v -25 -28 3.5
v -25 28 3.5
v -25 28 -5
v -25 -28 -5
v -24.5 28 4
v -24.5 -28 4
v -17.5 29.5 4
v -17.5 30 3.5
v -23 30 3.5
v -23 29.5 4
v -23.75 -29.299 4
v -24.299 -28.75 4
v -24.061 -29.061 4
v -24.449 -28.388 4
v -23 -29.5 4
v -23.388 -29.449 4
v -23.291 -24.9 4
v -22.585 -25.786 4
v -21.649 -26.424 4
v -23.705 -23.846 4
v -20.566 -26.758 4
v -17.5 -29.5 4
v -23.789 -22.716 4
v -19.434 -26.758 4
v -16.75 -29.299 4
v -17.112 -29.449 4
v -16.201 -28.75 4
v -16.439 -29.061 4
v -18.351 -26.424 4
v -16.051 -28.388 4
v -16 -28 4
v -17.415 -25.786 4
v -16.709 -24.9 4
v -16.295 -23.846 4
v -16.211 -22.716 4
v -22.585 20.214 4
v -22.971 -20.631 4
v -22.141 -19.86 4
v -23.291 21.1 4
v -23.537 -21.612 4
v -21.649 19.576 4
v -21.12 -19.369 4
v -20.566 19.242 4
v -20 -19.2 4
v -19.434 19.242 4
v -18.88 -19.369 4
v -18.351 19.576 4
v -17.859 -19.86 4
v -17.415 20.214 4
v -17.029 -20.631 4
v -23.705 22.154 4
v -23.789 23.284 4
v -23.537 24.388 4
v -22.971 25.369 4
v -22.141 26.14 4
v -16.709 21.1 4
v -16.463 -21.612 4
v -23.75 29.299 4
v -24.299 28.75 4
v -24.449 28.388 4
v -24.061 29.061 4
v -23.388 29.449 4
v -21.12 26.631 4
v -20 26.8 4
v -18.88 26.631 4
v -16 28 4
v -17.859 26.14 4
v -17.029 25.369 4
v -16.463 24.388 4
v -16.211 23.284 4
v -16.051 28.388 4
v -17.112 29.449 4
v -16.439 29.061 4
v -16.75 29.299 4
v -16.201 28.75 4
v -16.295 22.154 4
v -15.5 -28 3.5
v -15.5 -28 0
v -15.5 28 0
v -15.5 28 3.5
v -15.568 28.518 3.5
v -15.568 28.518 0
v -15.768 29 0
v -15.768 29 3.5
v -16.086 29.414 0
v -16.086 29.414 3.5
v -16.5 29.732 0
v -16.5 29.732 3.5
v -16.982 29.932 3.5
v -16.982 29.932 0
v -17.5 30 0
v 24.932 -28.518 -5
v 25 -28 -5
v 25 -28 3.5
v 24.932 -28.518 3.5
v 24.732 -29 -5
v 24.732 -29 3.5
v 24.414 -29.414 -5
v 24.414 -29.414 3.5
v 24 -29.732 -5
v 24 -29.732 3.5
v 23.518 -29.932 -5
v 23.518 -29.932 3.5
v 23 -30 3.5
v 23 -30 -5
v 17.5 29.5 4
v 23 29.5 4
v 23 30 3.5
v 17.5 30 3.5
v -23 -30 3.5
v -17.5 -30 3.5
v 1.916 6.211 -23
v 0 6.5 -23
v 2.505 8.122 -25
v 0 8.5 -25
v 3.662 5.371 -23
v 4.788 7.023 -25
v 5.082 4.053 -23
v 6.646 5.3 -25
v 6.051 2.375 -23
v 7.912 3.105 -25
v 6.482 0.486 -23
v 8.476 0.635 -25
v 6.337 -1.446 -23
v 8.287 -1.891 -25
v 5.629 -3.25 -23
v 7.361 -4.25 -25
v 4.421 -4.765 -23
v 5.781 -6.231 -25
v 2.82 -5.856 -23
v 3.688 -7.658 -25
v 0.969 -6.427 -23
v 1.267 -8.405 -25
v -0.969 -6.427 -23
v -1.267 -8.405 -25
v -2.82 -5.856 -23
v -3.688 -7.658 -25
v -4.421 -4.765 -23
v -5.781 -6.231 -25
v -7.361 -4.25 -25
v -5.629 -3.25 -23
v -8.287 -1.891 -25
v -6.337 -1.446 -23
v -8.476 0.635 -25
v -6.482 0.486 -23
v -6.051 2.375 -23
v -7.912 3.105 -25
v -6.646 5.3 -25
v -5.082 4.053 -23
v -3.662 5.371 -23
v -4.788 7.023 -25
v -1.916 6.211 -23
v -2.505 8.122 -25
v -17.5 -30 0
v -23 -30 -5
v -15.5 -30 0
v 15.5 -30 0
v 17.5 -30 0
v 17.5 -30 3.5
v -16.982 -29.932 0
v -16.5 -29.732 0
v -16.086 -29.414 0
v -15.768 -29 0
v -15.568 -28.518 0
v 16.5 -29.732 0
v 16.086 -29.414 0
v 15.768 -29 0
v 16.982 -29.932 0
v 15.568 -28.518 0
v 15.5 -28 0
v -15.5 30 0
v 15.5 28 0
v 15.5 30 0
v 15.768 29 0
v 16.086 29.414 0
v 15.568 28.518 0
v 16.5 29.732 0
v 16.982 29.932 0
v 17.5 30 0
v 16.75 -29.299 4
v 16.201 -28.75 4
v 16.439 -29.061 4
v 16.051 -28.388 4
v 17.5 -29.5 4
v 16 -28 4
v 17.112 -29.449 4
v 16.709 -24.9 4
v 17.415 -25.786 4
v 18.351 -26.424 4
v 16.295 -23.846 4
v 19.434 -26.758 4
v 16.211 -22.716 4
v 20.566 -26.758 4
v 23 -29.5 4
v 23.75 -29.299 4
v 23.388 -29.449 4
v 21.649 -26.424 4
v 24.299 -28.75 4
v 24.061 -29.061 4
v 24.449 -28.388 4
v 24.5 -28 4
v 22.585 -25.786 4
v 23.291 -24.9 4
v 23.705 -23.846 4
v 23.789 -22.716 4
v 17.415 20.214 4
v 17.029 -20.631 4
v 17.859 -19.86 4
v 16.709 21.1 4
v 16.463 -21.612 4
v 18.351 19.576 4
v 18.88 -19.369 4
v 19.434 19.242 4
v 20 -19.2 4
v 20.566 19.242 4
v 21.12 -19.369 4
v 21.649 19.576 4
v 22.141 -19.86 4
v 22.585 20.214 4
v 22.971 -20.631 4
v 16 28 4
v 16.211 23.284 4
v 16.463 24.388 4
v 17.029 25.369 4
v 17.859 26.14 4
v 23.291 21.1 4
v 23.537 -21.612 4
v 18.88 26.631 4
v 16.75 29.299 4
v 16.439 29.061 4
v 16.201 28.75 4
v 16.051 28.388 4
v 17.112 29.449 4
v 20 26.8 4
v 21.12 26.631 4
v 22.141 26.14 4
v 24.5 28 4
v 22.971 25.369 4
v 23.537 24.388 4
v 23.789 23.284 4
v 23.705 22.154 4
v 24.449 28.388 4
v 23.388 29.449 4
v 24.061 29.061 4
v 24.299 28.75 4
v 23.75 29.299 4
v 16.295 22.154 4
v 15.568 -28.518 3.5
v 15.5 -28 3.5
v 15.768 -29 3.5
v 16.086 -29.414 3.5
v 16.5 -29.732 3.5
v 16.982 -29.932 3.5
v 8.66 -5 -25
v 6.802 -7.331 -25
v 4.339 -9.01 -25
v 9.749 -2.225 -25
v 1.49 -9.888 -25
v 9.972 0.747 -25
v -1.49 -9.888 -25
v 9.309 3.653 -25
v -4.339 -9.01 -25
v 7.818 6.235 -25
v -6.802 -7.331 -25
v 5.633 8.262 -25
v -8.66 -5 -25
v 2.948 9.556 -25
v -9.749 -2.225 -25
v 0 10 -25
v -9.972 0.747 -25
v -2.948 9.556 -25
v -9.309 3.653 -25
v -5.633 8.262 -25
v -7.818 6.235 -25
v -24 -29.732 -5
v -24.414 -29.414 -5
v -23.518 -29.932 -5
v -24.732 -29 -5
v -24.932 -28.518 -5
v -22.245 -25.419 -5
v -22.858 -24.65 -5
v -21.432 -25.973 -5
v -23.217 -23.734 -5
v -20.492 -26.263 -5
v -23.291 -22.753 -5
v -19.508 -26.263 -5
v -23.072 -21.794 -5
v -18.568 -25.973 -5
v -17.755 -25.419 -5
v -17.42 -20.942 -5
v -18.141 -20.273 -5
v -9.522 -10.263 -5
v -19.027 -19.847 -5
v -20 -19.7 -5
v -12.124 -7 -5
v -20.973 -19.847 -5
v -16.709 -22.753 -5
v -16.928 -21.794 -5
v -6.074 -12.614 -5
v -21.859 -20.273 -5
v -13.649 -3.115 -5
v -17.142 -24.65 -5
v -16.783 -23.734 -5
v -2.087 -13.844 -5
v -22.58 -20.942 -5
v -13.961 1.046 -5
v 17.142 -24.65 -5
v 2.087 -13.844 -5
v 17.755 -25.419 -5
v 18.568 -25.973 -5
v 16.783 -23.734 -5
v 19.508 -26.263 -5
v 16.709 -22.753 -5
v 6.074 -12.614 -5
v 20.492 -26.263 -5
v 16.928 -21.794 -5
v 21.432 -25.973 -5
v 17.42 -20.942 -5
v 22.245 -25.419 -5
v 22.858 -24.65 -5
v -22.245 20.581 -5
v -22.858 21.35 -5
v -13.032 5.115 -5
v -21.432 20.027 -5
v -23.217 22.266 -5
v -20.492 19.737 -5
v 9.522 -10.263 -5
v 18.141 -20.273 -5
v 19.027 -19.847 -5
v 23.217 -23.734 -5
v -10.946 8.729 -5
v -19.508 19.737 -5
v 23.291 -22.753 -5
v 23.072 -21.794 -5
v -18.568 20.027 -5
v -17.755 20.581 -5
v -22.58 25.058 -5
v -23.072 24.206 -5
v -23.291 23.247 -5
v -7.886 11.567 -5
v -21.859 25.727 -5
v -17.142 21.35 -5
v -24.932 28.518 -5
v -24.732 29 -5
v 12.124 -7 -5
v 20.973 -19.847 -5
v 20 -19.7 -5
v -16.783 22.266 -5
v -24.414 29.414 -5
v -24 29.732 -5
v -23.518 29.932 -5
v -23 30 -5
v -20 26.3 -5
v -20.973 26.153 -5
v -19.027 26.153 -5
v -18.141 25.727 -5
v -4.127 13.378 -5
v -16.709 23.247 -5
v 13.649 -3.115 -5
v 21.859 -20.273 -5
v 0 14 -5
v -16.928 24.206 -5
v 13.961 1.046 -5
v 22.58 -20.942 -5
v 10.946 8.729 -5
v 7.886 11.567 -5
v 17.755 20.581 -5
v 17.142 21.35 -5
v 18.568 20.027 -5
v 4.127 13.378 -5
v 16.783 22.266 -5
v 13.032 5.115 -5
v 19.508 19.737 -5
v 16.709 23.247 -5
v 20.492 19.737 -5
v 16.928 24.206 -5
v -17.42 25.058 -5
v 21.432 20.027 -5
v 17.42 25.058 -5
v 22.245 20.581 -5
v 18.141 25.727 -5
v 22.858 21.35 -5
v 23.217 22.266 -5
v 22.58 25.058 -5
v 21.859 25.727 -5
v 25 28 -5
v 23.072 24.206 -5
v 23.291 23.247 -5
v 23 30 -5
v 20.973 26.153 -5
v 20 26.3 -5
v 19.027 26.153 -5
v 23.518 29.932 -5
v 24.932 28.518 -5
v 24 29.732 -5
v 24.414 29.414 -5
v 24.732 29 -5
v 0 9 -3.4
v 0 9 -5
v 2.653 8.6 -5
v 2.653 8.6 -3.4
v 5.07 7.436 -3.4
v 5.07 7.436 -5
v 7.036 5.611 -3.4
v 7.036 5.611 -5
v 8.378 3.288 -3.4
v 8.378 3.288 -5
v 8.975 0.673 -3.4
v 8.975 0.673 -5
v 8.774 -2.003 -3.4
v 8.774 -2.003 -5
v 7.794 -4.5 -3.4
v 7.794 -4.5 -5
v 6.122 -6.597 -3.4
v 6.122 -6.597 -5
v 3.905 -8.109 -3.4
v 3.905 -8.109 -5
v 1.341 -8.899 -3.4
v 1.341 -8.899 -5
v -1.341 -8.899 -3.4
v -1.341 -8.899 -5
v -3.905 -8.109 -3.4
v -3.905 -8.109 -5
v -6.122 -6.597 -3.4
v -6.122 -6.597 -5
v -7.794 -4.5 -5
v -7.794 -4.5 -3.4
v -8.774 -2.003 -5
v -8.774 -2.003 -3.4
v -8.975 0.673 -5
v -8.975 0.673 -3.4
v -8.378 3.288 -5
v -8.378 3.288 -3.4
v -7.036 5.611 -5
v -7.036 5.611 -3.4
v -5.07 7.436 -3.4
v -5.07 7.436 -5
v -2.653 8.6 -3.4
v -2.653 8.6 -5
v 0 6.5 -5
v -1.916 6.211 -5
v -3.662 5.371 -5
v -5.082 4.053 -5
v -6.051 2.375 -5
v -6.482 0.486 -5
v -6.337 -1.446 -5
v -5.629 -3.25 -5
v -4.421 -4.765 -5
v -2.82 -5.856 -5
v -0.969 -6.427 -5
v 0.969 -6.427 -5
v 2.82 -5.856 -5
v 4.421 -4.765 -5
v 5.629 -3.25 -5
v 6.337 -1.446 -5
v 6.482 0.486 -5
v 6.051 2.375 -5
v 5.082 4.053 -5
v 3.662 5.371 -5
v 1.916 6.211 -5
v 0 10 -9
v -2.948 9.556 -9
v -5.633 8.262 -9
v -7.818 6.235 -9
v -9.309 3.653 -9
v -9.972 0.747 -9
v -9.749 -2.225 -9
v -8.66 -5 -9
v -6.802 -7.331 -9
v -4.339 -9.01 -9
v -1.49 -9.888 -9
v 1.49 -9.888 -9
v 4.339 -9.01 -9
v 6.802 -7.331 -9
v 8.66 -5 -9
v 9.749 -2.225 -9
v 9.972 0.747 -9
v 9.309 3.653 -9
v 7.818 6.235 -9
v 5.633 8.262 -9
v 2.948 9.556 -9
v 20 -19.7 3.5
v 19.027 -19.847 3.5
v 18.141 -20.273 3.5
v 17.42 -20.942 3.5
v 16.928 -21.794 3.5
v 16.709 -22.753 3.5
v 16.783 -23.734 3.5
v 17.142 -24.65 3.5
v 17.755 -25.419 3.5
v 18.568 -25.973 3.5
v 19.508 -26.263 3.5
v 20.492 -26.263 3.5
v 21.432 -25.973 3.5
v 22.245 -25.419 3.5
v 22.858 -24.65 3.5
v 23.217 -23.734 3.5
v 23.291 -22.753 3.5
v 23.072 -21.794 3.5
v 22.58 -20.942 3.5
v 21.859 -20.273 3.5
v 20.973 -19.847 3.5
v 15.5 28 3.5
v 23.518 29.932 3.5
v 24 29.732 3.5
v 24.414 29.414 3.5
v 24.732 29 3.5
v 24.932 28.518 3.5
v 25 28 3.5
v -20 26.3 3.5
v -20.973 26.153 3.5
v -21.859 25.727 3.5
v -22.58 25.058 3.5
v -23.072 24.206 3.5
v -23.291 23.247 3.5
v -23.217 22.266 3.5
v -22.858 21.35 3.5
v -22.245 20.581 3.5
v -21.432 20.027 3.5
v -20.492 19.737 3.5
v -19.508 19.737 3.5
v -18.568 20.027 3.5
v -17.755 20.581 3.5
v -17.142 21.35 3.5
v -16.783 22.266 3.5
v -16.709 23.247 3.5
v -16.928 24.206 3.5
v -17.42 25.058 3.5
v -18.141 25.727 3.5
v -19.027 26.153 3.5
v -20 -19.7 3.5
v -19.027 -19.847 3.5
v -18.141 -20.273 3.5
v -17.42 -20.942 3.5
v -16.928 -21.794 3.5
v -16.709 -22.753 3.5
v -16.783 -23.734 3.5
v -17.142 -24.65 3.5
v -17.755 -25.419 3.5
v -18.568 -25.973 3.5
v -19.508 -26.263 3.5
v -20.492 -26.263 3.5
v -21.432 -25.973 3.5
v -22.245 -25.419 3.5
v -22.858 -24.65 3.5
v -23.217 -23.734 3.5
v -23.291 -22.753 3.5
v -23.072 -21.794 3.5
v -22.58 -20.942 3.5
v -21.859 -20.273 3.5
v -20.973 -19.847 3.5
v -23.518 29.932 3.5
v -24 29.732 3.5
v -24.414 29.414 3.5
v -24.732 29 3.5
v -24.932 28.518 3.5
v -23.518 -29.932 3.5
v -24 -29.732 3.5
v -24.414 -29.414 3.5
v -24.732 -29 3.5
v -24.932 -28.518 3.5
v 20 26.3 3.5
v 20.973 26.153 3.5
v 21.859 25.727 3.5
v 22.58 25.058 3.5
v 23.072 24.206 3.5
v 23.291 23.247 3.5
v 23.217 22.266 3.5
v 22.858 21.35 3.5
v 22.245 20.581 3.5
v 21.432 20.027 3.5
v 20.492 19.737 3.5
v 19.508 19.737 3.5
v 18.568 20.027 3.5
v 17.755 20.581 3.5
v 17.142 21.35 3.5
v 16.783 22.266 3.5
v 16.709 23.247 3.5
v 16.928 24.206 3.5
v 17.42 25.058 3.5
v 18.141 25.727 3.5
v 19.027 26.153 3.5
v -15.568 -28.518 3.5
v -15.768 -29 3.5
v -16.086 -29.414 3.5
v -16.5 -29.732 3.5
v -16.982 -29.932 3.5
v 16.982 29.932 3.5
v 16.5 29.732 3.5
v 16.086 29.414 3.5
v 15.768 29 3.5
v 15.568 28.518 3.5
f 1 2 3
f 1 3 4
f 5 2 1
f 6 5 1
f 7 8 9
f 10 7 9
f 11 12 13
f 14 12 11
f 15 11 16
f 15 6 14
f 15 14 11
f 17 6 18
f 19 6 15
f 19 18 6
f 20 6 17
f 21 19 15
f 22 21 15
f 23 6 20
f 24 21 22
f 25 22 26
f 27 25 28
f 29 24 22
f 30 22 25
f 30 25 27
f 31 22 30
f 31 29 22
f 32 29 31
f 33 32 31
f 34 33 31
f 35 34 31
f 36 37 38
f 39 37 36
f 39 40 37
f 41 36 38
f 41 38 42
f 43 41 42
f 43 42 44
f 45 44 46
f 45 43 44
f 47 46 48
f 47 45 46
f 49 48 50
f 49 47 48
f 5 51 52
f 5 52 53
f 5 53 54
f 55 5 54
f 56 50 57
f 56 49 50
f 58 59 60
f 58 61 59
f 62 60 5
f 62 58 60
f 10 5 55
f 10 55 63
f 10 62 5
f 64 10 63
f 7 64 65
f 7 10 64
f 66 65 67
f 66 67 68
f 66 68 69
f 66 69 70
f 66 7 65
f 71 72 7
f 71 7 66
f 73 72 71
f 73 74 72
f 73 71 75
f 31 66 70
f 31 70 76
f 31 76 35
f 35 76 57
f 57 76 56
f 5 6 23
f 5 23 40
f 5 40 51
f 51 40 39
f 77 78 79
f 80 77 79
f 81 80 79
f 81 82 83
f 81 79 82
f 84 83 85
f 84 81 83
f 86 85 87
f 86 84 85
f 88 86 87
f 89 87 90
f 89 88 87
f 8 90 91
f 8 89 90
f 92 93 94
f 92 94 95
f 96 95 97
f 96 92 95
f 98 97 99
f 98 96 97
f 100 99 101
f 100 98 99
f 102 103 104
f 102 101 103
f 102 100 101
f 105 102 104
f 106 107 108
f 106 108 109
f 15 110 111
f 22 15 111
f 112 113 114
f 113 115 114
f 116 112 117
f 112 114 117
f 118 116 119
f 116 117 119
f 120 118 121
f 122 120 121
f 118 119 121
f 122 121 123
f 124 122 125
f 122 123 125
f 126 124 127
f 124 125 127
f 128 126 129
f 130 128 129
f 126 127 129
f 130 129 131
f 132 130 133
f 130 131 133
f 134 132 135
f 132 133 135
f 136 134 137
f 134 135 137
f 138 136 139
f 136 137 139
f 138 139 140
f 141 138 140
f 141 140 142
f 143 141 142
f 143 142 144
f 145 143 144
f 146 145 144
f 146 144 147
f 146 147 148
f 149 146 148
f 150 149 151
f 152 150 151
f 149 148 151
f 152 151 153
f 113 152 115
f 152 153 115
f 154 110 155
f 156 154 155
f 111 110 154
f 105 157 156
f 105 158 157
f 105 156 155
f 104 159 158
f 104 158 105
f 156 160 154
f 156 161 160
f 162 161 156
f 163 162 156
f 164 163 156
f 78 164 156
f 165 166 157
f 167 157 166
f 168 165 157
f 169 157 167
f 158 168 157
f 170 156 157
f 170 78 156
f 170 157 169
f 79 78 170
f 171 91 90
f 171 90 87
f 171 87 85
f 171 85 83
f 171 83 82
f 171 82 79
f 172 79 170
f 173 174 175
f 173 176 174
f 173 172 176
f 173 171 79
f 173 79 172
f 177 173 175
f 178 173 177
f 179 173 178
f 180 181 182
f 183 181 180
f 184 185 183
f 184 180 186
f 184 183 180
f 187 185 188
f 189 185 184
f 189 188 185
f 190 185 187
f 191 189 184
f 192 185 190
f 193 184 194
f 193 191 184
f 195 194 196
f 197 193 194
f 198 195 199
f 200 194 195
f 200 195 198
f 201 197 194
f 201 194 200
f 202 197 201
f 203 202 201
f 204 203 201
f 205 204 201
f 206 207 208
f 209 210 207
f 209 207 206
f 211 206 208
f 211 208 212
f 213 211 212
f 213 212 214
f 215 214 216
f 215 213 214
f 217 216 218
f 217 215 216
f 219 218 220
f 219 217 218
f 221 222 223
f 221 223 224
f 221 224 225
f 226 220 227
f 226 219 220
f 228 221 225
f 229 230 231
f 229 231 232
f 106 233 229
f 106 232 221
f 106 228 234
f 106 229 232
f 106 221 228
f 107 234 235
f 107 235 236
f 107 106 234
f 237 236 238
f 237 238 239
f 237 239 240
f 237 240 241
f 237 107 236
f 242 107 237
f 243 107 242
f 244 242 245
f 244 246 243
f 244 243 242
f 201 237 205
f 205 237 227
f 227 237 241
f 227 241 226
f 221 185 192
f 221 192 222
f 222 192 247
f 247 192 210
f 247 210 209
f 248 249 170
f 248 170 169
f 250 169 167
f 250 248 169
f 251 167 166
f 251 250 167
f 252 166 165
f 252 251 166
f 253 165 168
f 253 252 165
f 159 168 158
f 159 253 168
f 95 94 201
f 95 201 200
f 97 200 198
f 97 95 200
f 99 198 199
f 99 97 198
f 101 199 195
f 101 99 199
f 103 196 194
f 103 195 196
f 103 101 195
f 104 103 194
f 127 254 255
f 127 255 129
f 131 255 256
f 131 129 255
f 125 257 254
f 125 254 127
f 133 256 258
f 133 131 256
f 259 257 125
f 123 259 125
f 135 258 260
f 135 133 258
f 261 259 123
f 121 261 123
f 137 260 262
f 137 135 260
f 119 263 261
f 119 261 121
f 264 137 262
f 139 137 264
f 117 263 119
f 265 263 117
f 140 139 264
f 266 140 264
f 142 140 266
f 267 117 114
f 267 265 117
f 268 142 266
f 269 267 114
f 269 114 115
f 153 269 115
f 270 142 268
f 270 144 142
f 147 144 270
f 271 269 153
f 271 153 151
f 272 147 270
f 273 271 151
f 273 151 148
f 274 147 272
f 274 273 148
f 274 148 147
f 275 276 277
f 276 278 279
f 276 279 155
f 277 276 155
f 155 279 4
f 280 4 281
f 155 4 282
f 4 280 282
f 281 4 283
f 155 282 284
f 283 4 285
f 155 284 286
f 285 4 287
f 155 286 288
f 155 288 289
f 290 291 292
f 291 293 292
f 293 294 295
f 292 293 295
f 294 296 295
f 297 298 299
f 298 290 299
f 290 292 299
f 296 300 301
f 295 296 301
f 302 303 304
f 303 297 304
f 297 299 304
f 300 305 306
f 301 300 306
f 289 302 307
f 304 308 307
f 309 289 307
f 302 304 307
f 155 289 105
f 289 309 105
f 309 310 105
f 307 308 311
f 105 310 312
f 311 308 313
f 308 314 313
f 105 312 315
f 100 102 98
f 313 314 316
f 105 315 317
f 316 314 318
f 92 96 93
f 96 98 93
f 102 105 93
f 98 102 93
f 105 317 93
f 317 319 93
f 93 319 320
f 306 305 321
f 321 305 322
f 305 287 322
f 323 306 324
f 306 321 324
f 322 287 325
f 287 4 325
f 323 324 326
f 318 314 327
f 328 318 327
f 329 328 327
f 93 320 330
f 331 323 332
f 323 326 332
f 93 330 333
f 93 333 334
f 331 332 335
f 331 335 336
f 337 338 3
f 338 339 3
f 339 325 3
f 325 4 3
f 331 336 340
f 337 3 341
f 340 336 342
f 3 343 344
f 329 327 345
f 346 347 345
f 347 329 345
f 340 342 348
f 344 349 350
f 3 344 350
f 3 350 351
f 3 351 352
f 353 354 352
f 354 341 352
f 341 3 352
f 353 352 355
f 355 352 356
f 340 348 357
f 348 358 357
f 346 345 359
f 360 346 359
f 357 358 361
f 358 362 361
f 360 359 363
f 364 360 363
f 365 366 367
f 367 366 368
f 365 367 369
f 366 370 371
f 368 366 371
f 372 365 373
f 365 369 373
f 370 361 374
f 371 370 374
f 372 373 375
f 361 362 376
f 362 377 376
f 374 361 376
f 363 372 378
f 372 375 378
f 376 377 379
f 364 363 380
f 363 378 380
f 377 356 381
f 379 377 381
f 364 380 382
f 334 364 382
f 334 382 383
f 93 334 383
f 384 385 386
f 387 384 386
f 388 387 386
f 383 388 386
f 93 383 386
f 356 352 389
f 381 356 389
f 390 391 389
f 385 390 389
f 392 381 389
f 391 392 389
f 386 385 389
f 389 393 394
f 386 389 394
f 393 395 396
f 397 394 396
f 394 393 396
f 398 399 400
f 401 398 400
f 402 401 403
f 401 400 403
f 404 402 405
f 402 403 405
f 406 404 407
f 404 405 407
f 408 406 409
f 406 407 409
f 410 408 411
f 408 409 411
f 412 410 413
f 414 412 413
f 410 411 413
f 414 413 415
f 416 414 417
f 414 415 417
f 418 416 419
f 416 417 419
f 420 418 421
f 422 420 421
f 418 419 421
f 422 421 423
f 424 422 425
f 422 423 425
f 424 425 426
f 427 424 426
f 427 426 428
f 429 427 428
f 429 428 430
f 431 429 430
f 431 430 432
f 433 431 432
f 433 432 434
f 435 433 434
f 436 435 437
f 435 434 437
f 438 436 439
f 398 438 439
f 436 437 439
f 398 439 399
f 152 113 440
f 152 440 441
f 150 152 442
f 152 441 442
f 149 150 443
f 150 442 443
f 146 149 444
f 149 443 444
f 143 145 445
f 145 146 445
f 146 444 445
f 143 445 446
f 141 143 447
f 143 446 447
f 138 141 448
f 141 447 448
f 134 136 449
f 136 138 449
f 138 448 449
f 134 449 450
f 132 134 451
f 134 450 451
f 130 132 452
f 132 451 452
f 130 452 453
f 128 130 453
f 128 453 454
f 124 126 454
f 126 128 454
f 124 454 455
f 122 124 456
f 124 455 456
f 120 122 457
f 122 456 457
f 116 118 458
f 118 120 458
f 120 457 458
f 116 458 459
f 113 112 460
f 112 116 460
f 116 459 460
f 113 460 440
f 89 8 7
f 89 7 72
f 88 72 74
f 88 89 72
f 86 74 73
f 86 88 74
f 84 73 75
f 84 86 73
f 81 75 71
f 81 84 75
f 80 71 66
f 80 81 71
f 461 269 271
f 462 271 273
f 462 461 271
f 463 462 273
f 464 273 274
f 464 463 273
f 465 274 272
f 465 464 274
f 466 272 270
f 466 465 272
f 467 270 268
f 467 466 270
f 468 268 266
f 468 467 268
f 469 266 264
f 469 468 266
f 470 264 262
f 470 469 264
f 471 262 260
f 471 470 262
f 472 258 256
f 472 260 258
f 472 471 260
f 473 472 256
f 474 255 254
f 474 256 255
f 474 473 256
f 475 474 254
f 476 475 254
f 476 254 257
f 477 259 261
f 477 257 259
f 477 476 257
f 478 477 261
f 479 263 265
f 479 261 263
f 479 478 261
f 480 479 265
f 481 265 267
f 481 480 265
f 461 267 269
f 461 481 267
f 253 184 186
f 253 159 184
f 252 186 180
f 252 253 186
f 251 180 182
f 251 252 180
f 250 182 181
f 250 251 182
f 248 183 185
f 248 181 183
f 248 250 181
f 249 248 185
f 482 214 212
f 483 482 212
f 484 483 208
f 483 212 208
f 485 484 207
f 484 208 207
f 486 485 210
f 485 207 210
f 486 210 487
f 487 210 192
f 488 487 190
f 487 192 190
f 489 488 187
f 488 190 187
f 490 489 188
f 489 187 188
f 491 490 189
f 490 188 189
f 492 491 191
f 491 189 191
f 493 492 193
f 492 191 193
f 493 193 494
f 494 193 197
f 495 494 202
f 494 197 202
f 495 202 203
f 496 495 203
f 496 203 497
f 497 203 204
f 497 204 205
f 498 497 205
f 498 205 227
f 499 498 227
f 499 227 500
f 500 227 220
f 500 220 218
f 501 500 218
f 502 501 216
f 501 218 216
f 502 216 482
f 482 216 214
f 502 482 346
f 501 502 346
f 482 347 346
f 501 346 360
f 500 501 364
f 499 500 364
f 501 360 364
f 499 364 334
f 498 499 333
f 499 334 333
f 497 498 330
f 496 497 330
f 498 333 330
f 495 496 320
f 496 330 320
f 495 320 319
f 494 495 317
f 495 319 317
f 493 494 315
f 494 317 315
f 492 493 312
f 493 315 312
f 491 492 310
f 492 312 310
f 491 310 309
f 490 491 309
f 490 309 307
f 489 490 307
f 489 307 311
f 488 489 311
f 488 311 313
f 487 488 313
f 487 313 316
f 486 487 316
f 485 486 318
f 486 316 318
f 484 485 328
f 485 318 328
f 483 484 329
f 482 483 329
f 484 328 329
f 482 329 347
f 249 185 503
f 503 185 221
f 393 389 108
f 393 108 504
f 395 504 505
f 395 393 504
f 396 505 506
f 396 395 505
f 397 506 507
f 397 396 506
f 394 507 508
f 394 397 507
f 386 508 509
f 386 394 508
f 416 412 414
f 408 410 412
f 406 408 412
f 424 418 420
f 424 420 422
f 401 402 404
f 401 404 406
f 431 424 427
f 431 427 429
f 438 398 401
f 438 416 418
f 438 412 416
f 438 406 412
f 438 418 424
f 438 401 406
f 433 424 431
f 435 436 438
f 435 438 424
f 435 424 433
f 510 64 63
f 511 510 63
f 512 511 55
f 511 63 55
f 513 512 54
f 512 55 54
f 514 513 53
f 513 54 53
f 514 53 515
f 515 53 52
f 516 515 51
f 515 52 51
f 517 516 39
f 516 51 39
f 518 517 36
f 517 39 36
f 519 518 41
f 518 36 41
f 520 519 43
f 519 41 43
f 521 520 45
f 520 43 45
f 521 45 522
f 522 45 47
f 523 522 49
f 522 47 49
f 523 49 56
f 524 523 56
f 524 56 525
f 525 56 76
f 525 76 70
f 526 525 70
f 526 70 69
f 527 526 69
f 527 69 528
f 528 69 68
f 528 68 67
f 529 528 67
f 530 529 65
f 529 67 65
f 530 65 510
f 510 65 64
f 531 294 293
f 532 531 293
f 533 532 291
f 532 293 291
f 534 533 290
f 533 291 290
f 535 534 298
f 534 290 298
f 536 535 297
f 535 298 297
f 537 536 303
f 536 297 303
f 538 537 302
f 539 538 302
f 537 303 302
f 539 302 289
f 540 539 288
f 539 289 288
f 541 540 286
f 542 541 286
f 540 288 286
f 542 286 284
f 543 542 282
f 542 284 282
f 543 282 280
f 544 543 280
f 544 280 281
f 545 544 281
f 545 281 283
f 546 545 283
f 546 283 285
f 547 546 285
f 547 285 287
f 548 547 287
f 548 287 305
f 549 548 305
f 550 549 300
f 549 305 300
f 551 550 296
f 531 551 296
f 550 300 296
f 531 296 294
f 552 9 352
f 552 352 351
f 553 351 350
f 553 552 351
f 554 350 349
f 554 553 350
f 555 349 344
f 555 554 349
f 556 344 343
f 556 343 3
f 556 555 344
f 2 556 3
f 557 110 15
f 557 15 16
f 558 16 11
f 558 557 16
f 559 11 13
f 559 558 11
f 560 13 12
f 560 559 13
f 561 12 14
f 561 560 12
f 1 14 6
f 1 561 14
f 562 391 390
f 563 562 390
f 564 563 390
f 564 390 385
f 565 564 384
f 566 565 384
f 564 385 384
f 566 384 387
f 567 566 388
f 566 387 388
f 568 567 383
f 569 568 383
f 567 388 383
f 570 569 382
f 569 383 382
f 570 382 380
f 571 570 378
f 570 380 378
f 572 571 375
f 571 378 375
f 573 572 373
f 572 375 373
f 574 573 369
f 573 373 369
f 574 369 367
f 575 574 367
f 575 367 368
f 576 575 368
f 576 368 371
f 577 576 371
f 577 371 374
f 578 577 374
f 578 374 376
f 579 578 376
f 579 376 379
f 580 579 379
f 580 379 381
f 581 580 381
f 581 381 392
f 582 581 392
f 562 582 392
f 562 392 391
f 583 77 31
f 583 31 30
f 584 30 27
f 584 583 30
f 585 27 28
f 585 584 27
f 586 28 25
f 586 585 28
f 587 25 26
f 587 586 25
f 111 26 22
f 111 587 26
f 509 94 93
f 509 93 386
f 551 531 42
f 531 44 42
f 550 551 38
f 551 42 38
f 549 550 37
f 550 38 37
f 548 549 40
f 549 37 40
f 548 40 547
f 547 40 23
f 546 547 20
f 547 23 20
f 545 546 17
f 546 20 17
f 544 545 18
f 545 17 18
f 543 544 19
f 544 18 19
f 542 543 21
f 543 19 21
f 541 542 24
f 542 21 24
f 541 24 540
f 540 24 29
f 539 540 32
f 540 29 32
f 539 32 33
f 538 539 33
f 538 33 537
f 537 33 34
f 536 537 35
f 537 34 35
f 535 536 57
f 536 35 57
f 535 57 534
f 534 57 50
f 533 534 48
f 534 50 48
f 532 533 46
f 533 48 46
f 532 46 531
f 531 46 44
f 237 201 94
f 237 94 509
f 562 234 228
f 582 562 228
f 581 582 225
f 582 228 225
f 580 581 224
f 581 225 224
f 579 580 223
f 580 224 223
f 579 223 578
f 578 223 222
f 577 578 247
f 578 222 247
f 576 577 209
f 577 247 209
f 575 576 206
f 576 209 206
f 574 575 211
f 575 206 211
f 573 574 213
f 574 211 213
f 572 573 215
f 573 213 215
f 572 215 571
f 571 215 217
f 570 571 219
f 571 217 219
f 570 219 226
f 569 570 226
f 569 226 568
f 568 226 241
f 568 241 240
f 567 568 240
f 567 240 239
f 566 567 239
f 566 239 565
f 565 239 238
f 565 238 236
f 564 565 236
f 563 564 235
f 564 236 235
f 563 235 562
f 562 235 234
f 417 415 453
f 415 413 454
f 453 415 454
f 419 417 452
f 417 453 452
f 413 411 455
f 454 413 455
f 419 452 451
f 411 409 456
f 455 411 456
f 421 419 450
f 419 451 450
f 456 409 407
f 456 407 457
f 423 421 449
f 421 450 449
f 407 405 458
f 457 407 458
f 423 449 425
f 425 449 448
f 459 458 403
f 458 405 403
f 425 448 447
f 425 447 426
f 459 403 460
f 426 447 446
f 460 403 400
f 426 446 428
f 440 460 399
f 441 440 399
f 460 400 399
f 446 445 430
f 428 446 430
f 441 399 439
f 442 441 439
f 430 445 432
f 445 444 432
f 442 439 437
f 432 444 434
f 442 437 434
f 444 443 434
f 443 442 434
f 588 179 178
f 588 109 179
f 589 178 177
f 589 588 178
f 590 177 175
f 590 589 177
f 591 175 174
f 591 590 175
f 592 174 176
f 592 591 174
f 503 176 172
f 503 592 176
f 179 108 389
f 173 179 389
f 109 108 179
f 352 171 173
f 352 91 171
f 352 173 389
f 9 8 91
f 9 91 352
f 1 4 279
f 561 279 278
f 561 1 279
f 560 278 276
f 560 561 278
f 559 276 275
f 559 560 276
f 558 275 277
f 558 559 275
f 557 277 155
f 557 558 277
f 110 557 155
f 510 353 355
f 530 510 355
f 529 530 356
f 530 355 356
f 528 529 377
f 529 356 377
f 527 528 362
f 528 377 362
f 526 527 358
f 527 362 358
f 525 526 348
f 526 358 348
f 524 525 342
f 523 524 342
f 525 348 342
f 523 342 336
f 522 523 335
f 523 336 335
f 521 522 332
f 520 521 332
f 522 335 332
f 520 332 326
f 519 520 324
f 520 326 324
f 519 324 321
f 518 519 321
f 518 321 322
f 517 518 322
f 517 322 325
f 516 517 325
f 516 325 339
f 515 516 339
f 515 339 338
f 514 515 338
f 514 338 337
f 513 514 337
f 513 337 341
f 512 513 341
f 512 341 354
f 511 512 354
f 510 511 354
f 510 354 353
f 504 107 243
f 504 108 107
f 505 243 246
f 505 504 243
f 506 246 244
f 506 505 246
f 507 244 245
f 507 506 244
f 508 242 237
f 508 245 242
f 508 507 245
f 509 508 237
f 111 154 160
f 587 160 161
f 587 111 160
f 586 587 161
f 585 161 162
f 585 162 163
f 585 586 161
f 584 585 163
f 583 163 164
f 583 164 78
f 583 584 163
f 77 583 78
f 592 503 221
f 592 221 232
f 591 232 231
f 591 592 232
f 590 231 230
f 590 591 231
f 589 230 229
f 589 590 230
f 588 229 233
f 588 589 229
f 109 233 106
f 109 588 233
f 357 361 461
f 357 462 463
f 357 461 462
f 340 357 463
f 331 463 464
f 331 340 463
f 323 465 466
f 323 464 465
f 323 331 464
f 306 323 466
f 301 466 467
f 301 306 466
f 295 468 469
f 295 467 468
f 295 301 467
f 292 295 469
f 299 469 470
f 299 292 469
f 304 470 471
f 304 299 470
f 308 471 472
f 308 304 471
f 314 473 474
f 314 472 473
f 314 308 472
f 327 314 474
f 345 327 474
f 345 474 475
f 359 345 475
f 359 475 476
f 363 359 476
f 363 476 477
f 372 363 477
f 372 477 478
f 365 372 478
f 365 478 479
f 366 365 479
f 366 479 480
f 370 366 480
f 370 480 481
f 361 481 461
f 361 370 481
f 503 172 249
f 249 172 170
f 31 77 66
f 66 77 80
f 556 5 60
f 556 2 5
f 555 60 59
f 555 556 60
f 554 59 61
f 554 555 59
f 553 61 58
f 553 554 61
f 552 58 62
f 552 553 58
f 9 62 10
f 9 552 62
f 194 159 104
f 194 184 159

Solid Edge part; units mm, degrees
sketch "Sketch1" plane through (0, 0, 0) normal (0, 0, 1) x (1, 0, 0)
  line L0 (25, 30) -> (-25, 30)
  line L1 (-25, 30) -> (-25, -30)
  line L2 (-25, -30) -> (25, -30)
  line L3 (25, -30) -> (25, 30)
extrude "Extrusionsausprägung_24" add sketch "Sketch1" against normal blind 5
sketch "Sketch2" plane through (0, 0, 0) normal (0, 0, 1) x (0, -1, 0)
  line L0 (-30, 15.5) -> (30, 15.5)
  line L1 (30, 15.5) -> (30, 25)
  line L2 (30, 25) -> (-30, 25)
  line L3 (-30, 25) -> (-30, 15.5)
extrude "Extrusionsausprägung_25" add sketch "Sketch2" along normal blind 4
mirror "Mirror1" about plane through (0, 0, 0) normal (1, 0, 0) of "Extrusionsausprägung_25"
sketch "Sketch3" plane through (0, 0, -5) normal (0, 0, -1) x (0, 1, 0)
  circle A0 centre (-23, 20) radius 3.3
  circle A1 centre (23, 20) radius 3.3
extrude "Extrusionsausschnitt_32" cut sketch "Sketch3" against normal blind 38
sketch "Sketch4" plane through (0, 0, -5) normal (0, 0, -1) x (0, 1, 0)
  circle A0 centre (0, 0) radius 9
extrude "Extrusionsausschnitt_33" cut sketch "Sketch4" against normal blind 1.6
mirror "Mirror2" about plane through (0, 0, 0) normal (1, 0, 0) of "Extrusionsausschnitt_32"
sketch "Sketch5" plane through (0, 0, -5) normal (0, 0, -1) x (0, 1, 0)
  circle A0 centre (0, 0) radius 10
  circle A1 centre (0, 0) radius 6.5
extrude "Extrusionsausprägung_27" add sketch "Sketch5" along normal blind 20
chamfer "Fase_14" distance 4 angle 45 1 edges at (0, -10, -5)
chamfer "Fase_15" distance 2 angle 45 1 edges at (0, -6.5, -25)
fillet "Verrundung_17" radius 2 8 edges at (-25, -30, -0.5) (-15.5, -30, 2) (15.5, -30, 2) (25, -30, -0.5) (-25, 30, -0.5) (25, 30, -0.5) (15.5, 30, 2) (-15.5, 30, 2)
chamfer "Fase_16" distance 0.5 angle 45 20 edges at (16.7, -23, 4) (16.7, 23, 4) (20.25, 30, 4) (16.0858, 29.4142, 4) (15.5, 0, 4) (16.0858, -29.4142, 4) (20.25, -30, 4) (24.4142, -29.4142, 4) (25, 0, 4) (24.4142, 29.4142, 4) (-16.7, 23, 4) (-16.7, -23, 4) (-15.5, 0, 4) (-16.0858, 29.4142, 4) (-20.25, 30, 4) (-24.4142, 29.4142, 4) (-25, 0, 4) (-24.4142, -29.4142, 4) (-20.25, -30, 4) (-16.0858, -29.4142, 4)
